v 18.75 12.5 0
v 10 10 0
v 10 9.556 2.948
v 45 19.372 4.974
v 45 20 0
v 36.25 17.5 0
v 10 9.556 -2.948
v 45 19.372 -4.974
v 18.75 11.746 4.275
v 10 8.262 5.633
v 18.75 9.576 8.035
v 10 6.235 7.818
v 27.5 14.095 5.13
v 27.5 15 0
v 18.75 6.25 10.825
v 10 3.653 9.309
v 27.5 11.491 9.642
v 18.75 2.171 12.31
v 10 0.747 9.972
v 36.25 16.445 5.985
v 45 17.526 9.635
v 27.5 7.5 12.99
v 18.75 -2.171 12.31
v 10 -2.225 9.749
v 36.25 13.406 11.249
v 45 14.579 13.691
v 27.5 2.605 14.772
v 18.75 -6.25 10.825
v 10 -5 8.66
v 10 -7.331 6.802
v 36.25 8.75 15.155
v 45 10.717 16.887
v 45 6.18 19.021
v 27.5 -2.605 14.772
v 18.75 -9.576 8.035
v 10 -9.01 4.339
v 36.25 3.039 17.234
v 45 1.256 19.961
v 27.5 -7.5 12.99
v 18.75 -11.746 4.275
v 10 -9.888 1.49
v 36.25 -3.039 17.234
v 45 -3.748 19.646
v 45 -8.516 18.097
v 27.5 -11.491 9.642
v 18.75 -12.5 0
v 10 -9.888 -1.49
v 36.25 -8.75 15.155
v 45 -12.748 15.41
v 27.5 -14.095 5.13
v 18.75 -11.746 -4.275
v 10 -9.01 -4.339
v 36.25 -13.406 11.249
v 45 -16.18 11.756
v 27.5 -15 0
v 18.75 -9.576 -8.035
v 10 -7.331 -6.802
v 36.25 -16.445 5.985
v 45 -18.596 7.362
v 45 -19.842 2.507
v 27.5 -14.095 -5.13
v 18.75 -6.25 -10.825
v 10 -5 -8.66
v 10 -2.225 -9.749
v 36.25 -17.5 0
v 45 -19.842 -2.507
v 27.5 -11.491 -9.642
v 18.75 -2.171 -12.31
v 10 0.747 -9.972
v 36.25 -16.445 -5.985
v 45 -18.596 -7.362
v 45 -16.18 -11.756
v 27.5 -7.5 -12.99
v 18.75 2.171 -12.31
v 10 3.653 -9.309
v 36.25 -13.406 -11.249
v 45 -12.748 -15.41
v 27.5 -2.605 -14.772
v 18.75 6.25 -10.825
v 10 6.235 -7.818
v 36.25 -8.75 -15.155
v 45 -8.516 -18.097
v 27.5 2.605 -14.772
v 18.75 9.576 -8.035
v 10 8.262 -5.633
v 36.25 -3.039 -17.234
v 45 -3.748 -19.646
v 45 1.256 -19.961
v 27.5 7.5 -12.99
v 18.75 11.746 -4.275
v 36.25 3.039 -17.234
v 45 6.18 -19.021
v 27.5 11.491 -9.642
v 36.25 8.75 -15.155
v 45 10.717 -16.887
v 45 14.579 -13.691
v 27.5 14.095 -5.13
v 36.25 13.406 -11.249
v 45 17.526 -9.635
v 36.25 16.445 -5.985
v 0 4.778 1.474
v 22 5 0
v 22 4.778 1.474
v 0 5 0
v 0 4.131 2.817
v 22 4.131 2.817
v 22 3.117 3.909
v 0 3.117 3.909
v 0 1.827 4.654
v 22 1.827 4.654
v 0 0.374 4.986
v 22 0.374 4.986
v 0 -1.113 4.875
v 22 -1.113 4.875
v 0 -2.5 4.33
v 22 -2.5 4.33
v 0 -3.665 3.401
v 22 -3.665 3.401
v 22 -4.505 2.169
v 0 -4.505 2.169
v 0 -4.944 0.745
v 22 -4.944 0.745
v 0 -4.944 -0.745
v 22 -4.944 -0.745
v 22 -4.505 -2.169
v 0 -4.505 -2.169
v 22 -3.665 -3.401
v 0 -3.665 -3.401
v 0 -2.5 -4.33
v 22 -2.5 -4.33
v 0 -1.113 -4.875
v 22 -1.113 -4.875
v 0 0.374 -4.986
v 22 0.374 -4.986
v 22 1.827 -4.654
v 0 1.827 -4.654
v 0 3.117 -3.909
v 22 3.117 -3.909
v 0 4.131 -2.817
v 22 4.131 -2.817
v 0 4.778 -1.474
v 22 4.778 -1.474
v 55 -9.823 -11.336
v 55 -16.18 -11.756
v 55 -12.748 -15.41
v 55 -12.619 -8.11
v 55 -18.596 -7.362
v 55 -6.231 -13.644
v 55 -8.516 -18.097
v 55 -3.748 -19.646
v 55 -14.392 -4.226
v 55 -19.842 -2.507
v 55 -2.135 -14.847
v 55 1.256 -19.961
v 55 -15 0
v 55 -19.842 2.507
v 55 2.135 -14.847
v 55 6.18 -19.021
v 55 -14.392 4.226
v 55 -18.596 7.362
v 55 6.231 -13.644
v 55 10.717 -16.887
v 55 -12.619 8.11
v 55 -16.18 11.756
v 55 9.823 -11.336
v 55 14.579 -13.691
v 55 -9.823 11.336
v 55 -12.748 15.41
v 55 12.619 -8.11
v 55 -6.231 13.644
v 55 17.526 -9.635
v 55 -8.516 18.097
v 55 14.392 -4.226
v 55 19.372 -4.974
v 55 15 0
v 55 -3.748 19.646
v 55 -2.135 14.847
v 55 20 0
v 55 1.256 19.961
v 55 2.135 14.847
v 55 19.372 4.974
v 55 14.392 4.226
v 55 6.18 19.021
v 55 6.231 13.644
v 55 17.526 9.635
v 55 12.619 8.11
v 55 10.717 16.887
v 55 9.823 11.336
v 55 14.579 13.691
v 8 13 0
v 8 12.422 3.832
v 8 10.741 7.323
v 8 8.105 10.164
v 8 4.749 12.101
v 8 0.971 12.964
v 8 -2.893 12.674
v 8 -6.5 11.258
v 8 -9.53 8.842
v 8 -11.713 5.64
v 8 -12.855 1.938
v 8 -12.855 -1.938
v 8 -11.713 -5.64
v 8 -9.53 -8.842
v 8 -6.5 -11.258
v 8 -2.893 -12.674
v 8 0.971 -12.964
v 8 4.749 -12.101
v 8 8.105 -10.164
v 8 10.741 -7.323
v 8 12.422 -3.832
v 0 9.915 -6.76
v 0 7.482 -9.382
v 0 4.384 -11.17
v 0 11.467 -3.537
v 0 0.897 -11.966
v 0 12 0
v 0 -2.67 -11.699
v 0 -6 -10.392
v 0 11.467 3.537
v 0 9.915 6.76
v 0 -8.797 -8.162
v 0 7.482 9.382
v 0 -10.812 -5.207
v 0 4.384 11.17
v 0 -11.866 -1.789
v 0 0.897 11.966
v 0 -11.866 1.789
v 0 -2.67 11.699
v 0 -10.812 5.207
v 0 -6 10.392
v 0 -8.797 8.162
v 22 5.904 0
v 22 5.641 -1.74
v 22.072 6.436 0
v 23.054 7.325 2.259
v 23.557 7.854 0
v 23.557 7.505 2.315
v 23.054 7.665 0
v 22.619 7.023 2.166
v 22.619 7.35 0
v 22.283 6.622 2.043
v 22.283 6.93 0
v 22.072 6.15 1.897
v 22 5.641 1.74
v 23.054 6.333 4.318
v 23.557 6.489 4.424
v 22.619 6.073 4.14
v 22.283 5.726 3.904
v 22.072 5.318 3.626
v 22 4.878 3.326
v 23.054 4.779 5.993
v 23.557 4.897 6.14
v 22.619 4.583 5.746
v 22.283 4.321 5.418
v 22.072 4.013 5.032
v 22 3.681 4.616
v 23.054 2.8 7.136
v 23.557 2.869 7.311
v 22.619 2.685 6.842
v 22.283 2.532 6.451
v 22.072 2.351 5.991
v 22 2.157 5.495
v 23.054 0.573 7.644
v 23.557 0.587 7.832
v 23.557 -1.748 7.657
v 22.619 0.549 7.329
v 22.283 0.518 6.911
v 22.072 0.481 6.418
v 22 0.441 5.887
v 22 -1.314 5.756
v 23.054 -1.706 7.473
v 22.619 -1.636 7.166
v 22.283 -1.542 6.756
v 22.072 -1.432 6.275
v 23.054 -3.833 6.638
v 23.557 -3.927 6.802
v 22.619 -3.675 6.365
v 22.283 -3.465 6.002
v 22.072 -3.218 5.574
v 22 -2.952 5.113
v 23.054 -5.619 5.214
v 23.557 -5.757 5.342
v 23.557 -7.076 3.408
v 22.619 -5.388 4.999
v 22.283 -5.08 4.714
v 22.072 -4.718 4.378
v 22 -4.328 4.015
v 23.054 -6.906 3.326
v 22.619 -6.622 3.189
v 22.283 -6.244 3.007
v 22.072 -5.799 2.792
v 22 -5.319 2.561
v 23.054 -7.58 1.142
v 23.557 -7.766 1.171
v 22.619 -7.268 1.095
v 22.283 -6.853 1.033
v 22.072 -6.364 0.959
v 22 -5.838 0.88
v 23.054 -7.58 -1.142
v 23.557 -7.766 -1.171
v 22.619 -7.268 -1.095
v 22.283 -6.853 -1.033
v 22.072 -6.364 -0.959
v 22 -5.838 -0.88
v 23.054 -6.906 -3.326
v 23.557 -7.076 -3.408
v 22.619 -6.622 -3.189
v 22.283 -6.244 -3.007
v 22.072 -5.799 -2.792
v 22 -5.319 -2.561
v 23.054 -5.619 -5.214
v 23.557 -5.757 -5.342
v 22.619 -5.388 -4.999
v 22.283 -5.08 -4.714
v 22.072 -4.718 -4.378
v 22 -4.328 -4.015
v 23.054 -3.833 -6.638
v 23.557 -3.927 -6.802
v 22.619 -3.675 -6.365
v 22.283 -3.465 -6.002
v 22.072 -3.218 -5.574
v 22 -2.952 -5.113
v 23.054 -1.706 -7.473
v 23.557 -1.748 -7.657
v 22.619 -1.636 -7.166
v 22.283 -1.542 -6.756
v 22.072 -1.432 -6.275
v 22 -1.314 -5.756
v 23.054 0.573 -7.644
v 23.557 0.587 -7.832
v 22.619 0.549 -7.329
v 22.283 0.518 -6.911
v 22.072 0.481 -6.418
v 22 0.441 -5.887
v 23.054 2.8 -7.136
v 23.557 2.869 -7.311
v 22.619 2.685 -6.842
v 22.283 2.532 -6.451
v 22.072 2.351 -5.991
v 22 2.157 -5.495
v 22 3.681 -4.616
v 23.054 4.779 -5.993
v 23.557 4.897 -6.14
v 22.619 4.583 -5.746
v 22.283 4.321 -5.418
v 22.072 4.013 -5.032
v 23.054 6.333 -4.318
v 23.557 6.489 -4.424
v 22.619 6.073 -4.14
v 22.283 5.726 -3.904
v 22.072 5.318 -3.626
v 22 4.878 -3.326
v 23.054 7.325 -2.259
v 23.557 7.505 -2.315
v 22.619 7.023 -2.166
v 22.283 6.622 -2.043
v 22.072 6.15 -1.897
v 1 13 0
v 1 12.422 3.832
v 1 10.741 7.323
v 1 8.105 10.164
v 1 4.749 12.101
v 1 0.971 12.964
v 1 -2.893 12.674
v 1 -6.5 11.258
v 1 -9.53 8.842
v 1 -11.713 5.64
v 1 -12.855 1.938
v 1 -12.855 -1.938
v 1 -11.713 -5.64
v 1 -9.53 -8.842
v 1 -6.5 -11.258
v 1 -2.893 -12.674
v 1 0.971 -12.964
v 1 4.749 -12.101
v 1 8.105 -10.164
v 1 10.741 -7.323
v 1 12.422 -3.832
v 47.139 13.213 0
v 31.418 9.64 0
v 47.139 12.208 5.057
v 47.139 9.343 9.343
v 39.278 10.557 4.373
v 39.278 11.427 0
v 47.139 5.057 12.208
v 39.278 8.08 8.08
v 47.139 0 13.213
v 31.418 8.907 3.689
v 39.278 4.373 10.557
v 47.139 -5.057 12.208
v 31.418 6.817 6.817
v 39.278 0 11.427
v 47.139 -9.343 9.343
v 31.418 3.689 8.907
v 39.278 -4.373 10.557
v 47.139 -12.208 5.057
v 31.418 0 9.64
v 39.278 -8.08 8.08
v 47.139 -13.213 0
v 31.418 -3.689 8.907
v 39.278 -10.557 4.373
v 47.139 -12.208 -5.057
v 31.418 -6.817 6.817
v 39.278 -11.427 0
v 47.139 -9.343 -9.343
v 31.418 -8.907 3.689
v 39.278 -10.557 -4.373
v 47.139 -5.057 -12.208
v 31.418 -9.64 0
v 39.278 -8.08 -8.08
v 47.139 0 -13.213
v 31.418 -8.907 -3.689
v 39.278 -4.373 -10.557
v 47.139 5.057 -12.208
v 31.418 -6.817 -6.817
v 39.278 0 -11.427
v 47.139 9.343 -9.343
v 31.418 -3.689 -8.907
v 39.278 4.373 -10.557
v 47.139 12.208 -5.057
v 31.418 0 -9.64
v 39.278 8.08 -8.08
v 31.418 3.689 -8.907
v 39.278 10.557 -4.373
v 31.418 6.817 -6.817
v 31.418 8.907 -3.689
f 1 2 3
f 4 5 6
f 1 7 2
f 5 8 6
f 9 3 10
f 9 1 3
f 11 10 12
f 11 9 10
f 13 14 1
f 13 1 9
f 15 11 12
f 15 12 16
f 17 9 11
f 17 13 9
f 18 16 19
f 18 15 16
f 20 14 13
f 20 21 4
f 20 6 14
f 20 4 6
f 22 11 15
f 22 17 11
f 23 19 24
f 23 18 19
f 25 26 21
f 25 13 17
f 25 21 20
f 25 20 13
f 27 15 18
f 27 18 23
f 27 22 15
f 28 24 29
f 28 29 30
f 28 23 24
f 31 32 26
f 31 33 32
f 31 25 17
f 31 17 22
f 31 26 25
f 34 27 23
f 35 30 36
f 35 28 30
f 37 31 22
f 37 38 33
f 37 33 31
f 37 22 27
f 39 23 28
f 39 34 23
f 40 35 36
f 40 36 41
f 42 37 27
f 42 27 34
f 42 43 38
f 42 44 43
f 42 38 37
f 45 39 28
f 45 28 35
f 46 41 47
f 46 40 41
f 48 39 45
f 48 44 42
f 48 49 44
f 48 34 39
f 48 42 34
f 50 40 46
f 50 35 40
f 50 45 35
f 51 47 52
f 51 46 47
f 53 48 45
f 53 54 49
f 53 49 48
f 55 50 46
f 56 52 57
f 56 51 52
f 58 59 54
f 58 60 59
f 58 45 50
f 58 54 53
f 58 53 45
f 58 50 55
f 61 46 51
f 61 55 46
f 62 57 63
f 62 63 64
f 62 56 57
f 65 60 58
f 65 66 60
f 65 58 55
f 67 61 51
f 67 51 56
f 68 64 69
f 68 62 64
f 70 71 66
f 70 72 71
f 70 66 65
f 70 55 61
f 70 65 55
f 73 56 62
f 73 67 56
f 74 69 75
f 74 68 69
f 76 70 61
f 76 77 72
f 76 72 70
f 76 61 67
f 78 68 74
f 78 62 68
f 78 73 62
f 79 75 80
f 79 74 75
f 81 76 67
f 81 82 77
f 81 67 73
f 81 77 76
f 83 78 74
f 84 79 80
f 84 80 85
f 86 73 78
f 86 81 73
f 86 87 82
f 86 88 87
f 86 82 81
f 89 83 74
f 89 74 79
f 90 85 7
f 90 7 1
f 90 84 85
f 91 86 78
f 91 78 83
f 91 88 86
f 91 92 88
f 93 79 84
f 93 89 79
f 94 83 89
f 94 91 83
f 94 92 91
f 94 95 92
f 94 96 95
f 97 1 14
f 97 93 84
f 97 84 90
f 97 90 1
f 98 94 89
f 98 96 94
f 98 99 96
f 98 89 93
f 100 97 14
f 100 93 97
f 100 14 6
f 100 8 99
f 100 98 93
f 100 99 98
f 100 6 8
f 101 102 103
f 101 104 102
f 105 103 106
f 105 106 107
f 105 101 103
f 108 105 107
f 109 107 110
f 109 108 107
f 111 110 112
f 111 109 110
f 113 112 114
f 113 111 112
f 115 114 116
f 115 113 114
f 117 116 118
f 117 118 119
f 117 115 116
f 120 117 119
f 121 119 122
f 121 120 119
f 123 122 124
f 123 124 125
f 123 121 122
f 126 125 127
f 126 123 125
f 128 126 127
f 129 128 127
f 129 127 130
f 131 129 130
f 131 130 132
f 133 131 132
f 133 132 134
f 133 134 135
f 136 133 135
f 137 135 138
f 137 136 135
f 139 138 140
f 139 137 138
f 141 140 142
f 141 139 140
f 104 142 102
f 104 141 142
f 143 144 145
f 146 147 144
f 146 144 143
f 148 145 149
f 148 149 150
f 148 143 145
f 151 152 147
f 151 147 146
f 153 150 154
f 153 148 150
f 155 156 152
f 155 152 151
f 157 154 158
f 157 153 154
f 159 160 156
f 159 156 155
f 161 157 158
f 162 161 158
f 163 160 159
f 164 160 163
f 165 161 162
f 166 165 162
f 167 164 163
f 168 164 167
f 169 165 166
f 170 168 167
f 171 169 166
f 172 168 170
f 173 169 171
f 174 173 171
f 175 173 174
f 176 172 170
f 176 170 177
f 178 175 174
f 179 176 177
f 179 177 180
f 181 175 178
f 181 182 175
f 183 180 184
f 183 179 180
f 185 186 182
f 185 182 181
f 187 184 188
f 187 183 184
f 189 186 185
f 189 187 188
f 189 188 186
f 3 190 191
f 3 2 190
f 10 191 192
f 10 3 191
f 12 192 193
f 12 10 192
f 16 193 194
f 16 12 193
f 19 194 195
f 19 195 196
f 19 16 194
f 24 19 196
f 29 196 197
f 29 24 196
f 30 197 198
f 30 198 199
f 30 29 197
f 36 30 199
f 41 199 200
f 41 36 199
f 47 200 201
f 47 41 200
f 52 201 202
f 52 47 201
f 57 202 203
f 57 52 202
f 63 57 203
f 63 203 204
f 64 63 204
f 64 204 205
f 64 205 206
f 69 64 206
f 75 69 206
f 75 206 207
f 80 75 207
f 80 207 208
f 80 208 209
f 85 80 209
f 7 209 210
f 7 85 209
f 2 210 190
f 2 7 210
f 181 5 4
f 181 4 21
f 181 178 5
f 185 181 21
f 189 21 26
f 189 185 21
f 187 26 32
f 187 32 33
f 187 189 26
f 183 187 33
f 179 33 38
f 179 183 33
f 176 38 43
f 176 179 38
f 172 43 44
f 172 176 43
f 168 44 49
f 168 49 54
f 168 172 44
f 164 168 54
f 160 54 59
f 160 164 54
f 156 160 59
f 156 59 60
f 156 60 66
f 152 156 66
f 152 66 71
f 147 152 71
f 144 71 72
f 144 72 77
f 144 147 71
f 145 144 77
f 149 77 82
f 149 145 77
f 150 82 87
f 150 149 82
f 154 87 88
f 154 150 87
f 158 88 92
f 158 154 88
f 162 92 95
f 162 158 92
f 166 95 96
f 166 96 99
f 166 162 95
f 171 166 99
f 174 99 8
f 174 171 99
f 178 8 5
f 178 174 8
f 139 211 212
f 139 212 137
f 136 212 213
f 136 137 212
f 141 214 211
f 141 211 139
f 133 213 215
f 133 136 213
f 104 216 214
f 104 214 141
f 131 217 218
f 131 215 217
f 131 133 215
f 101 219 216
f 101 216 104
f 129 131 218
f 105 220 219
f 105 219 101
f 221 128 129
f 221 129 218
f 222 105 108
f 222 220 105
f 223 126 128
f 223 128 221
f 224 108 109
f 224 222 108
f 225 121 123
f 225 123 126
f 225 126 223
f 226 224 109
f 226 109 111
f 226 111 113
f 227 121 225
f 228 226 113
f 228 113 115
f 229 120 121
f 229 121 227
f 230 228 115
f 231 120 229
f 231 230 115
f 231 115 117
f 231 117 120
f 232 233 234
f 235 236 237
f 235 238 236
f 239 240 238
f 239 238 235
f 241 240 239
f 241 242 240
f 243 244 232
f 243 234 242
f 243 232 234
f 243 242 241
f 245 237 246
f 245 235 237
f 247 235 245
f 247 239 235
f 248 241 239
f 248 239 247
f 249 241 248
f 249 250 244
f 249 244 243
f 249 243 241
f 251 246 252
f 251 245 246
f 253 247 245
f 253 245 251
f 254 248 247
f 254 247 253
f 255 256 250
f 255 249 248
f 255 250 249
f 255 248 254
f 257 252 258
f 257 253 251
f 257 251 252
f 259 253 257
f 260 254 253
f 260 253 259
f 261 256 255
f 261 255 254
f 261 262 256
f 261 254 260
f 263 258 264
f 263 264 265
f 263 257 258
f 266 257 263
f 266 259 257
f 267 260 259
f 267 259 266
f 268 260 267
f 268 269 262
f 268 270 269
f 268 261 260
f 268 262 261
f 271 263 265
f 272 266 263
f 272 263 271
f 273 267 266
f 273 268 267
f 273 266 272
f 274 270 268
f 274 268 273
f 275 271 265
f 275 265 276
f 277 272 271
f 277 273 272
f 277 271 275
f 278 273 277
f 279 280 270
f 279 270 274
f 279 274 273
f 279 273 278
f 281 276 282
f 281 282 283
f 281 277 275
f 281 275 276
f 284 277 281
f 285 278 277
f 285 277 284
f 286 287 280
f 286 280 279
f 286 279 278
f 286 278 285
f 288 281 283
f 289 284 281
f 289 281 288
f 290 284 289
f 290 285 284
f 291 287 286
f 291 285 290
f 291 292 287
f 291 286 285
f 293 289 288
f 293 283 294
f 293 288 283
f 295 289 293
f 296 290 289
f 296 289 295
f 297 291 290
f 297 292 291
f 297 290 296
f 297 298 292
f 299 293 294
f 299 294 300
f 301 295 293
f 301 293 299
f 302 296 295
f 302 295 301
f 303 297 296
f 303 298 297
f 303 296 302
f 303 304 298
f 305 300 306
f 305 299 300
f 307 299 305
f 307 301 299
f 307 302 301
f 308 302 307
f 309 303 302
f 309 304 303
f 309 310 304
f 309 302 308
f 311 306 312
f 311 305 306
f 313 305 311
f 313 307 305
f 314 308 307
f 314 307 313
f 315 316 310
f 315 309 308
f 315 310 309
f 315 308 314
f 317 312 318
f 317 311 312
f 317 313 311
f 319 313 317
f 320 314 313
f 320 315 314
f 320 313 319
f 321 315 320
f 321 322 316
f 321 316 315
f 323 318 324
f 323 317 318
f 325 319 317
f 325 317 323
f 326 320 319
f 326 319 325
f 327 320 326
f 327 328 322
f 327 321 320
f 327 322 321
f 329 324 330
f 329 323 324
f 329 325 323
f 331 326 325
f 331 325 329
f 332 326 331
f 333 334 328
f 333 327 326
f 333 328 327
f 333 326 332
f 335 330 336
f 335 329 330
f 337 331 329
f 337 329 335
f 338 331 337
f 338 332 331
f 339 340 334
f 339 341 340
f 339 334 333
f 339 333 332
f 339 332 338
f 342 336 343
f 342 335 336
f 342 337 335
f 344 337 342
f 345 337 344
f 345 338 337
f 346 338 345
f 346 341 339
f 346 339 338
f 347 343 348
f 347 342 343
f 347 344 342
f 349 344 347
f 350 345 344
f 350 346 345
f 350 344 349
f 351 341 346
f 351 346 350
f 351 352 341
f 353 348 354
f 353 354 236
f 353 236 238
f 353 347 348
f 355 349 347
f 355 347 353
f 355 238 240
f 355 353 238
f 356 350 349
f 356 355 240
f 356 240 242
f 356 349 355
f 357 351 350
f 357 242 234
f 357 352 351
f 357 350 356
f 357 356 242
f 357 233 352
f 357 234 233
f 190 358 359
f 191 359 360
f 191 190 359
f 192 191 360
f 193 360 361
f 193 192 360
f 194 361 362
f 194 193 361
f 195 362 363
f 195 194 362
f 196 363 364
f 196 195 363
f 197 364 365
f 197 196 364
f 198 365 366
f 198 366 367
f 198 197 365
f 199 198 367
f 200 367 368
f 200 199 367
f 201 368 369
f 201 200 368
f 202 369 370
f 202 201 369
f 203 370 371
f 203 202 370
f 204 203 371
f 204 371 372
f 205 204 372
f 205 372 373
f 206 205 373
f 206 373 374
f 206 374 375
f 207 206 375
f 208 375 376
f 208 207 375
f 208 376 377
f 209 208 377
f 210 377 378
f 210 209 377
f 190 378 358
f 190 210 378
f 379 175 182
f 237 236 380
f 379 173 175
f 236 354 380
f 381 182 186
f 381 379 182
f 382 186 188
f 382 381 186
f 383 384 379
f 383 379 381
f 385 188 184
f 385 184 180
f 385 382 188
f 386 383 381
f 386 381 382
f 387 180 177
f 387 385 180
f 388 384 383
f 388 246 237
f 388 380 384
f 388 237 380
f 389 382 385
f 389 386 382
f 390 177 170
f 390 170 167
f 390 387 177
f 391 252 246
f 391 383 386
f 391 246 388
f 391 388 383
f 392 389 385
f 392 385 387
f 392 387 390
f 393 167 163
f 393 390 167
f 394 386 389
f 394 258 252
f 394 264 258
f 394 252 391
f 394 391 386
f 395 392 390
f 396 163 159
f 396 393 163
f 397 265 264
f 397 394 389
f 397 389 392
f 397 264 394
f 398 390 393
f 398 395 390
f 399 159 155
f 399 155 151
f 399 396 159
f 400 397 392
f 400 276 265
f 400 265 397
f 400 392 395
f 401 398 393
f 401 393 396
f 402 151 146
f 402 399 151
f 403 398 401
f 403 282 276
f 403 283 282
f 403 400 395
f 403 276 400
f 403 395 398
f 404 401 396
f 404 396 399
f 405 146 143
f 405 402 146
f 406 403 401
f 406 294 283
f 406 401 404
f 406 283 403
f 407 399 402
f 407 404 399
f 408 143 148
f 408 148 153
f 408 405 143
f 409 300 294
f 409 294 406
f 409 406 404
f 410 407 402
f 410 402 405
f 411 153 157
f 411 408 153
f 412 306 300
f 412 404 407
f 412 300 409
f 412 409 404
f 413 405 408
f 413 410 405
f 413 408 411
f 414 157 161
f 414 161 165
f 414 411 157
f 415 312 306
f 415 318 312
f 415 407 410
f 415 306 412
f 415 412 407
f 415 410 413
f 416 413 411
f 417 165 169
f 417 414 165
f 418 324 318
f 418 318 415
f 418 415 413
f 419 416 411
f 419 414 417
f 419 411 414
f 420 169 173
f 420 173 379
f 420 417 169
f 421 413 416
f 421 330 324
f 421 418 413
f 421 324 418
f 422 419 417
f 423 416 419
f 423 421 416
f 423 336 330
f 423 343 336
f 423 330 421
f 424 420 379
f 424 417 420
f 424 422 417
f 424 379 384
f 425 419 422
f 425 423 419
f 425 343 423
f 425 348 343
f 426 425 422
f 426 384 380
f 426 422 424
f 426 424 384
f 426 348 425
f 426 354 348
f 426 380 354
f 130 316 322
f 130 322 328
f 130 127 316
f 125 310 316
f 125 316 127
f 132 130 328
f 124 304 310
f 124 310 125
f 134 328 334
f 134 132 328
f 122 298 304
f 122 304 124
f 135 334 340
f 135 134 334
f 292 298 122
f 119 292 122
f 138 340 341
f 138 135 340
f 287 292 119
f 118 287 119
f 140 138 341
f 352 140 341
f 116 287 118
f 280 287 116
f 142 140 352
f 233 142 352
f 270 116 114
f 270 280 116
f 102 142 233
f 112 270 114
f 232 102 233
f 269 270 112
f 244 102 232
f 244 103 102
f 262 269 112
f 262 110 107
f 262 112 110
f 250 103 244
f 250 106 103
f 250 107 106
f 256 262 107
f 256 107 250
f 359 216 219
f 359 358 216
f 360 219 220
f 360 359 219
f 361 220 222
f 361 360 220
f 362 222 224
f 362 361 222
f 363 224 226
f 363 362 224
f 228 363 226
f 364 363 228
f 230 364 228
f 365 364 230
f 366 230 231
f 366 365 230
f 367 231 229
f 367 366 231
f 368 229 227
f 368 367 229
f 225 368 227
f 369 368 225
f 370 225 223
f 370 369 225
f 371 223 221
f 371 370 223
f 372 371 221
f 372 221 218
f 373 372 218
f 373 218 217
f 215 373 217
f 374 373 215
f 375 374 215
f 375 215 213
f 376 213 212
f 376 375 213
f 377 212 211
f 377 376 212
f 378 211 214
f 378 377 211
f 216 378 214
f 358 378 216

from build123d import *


with BuildPart() as part:
    # 草圖1 → 旋轉1 (revolve)
    with BuildSketch(Plane.XY):
        with BuildLine():
            Line((0, 5), (0, 12))
            Line((0, 12), (1, 13))
            Line((1, 13), (8, 13))
            Line((8, 13), (10, 10))
            Line((10, 10), (45, 20))
            Line((45, 20), (55, 20))
            Line((55, 20), (55, 15))
            Line((55, 15), (23.556757793, 7.853808589))
            ThreePointArc((23.556757793, 7.853808589), (22.436912604, 7.151243881), (22, 5.903542878))
            Line((22, 5.903542878), (22, 5))
            Line((22, 5), (0, 5))
        make_face()
    revolve(axis=Axis((0, 0, 0), (1, 0, 0)))


solid = part.part
